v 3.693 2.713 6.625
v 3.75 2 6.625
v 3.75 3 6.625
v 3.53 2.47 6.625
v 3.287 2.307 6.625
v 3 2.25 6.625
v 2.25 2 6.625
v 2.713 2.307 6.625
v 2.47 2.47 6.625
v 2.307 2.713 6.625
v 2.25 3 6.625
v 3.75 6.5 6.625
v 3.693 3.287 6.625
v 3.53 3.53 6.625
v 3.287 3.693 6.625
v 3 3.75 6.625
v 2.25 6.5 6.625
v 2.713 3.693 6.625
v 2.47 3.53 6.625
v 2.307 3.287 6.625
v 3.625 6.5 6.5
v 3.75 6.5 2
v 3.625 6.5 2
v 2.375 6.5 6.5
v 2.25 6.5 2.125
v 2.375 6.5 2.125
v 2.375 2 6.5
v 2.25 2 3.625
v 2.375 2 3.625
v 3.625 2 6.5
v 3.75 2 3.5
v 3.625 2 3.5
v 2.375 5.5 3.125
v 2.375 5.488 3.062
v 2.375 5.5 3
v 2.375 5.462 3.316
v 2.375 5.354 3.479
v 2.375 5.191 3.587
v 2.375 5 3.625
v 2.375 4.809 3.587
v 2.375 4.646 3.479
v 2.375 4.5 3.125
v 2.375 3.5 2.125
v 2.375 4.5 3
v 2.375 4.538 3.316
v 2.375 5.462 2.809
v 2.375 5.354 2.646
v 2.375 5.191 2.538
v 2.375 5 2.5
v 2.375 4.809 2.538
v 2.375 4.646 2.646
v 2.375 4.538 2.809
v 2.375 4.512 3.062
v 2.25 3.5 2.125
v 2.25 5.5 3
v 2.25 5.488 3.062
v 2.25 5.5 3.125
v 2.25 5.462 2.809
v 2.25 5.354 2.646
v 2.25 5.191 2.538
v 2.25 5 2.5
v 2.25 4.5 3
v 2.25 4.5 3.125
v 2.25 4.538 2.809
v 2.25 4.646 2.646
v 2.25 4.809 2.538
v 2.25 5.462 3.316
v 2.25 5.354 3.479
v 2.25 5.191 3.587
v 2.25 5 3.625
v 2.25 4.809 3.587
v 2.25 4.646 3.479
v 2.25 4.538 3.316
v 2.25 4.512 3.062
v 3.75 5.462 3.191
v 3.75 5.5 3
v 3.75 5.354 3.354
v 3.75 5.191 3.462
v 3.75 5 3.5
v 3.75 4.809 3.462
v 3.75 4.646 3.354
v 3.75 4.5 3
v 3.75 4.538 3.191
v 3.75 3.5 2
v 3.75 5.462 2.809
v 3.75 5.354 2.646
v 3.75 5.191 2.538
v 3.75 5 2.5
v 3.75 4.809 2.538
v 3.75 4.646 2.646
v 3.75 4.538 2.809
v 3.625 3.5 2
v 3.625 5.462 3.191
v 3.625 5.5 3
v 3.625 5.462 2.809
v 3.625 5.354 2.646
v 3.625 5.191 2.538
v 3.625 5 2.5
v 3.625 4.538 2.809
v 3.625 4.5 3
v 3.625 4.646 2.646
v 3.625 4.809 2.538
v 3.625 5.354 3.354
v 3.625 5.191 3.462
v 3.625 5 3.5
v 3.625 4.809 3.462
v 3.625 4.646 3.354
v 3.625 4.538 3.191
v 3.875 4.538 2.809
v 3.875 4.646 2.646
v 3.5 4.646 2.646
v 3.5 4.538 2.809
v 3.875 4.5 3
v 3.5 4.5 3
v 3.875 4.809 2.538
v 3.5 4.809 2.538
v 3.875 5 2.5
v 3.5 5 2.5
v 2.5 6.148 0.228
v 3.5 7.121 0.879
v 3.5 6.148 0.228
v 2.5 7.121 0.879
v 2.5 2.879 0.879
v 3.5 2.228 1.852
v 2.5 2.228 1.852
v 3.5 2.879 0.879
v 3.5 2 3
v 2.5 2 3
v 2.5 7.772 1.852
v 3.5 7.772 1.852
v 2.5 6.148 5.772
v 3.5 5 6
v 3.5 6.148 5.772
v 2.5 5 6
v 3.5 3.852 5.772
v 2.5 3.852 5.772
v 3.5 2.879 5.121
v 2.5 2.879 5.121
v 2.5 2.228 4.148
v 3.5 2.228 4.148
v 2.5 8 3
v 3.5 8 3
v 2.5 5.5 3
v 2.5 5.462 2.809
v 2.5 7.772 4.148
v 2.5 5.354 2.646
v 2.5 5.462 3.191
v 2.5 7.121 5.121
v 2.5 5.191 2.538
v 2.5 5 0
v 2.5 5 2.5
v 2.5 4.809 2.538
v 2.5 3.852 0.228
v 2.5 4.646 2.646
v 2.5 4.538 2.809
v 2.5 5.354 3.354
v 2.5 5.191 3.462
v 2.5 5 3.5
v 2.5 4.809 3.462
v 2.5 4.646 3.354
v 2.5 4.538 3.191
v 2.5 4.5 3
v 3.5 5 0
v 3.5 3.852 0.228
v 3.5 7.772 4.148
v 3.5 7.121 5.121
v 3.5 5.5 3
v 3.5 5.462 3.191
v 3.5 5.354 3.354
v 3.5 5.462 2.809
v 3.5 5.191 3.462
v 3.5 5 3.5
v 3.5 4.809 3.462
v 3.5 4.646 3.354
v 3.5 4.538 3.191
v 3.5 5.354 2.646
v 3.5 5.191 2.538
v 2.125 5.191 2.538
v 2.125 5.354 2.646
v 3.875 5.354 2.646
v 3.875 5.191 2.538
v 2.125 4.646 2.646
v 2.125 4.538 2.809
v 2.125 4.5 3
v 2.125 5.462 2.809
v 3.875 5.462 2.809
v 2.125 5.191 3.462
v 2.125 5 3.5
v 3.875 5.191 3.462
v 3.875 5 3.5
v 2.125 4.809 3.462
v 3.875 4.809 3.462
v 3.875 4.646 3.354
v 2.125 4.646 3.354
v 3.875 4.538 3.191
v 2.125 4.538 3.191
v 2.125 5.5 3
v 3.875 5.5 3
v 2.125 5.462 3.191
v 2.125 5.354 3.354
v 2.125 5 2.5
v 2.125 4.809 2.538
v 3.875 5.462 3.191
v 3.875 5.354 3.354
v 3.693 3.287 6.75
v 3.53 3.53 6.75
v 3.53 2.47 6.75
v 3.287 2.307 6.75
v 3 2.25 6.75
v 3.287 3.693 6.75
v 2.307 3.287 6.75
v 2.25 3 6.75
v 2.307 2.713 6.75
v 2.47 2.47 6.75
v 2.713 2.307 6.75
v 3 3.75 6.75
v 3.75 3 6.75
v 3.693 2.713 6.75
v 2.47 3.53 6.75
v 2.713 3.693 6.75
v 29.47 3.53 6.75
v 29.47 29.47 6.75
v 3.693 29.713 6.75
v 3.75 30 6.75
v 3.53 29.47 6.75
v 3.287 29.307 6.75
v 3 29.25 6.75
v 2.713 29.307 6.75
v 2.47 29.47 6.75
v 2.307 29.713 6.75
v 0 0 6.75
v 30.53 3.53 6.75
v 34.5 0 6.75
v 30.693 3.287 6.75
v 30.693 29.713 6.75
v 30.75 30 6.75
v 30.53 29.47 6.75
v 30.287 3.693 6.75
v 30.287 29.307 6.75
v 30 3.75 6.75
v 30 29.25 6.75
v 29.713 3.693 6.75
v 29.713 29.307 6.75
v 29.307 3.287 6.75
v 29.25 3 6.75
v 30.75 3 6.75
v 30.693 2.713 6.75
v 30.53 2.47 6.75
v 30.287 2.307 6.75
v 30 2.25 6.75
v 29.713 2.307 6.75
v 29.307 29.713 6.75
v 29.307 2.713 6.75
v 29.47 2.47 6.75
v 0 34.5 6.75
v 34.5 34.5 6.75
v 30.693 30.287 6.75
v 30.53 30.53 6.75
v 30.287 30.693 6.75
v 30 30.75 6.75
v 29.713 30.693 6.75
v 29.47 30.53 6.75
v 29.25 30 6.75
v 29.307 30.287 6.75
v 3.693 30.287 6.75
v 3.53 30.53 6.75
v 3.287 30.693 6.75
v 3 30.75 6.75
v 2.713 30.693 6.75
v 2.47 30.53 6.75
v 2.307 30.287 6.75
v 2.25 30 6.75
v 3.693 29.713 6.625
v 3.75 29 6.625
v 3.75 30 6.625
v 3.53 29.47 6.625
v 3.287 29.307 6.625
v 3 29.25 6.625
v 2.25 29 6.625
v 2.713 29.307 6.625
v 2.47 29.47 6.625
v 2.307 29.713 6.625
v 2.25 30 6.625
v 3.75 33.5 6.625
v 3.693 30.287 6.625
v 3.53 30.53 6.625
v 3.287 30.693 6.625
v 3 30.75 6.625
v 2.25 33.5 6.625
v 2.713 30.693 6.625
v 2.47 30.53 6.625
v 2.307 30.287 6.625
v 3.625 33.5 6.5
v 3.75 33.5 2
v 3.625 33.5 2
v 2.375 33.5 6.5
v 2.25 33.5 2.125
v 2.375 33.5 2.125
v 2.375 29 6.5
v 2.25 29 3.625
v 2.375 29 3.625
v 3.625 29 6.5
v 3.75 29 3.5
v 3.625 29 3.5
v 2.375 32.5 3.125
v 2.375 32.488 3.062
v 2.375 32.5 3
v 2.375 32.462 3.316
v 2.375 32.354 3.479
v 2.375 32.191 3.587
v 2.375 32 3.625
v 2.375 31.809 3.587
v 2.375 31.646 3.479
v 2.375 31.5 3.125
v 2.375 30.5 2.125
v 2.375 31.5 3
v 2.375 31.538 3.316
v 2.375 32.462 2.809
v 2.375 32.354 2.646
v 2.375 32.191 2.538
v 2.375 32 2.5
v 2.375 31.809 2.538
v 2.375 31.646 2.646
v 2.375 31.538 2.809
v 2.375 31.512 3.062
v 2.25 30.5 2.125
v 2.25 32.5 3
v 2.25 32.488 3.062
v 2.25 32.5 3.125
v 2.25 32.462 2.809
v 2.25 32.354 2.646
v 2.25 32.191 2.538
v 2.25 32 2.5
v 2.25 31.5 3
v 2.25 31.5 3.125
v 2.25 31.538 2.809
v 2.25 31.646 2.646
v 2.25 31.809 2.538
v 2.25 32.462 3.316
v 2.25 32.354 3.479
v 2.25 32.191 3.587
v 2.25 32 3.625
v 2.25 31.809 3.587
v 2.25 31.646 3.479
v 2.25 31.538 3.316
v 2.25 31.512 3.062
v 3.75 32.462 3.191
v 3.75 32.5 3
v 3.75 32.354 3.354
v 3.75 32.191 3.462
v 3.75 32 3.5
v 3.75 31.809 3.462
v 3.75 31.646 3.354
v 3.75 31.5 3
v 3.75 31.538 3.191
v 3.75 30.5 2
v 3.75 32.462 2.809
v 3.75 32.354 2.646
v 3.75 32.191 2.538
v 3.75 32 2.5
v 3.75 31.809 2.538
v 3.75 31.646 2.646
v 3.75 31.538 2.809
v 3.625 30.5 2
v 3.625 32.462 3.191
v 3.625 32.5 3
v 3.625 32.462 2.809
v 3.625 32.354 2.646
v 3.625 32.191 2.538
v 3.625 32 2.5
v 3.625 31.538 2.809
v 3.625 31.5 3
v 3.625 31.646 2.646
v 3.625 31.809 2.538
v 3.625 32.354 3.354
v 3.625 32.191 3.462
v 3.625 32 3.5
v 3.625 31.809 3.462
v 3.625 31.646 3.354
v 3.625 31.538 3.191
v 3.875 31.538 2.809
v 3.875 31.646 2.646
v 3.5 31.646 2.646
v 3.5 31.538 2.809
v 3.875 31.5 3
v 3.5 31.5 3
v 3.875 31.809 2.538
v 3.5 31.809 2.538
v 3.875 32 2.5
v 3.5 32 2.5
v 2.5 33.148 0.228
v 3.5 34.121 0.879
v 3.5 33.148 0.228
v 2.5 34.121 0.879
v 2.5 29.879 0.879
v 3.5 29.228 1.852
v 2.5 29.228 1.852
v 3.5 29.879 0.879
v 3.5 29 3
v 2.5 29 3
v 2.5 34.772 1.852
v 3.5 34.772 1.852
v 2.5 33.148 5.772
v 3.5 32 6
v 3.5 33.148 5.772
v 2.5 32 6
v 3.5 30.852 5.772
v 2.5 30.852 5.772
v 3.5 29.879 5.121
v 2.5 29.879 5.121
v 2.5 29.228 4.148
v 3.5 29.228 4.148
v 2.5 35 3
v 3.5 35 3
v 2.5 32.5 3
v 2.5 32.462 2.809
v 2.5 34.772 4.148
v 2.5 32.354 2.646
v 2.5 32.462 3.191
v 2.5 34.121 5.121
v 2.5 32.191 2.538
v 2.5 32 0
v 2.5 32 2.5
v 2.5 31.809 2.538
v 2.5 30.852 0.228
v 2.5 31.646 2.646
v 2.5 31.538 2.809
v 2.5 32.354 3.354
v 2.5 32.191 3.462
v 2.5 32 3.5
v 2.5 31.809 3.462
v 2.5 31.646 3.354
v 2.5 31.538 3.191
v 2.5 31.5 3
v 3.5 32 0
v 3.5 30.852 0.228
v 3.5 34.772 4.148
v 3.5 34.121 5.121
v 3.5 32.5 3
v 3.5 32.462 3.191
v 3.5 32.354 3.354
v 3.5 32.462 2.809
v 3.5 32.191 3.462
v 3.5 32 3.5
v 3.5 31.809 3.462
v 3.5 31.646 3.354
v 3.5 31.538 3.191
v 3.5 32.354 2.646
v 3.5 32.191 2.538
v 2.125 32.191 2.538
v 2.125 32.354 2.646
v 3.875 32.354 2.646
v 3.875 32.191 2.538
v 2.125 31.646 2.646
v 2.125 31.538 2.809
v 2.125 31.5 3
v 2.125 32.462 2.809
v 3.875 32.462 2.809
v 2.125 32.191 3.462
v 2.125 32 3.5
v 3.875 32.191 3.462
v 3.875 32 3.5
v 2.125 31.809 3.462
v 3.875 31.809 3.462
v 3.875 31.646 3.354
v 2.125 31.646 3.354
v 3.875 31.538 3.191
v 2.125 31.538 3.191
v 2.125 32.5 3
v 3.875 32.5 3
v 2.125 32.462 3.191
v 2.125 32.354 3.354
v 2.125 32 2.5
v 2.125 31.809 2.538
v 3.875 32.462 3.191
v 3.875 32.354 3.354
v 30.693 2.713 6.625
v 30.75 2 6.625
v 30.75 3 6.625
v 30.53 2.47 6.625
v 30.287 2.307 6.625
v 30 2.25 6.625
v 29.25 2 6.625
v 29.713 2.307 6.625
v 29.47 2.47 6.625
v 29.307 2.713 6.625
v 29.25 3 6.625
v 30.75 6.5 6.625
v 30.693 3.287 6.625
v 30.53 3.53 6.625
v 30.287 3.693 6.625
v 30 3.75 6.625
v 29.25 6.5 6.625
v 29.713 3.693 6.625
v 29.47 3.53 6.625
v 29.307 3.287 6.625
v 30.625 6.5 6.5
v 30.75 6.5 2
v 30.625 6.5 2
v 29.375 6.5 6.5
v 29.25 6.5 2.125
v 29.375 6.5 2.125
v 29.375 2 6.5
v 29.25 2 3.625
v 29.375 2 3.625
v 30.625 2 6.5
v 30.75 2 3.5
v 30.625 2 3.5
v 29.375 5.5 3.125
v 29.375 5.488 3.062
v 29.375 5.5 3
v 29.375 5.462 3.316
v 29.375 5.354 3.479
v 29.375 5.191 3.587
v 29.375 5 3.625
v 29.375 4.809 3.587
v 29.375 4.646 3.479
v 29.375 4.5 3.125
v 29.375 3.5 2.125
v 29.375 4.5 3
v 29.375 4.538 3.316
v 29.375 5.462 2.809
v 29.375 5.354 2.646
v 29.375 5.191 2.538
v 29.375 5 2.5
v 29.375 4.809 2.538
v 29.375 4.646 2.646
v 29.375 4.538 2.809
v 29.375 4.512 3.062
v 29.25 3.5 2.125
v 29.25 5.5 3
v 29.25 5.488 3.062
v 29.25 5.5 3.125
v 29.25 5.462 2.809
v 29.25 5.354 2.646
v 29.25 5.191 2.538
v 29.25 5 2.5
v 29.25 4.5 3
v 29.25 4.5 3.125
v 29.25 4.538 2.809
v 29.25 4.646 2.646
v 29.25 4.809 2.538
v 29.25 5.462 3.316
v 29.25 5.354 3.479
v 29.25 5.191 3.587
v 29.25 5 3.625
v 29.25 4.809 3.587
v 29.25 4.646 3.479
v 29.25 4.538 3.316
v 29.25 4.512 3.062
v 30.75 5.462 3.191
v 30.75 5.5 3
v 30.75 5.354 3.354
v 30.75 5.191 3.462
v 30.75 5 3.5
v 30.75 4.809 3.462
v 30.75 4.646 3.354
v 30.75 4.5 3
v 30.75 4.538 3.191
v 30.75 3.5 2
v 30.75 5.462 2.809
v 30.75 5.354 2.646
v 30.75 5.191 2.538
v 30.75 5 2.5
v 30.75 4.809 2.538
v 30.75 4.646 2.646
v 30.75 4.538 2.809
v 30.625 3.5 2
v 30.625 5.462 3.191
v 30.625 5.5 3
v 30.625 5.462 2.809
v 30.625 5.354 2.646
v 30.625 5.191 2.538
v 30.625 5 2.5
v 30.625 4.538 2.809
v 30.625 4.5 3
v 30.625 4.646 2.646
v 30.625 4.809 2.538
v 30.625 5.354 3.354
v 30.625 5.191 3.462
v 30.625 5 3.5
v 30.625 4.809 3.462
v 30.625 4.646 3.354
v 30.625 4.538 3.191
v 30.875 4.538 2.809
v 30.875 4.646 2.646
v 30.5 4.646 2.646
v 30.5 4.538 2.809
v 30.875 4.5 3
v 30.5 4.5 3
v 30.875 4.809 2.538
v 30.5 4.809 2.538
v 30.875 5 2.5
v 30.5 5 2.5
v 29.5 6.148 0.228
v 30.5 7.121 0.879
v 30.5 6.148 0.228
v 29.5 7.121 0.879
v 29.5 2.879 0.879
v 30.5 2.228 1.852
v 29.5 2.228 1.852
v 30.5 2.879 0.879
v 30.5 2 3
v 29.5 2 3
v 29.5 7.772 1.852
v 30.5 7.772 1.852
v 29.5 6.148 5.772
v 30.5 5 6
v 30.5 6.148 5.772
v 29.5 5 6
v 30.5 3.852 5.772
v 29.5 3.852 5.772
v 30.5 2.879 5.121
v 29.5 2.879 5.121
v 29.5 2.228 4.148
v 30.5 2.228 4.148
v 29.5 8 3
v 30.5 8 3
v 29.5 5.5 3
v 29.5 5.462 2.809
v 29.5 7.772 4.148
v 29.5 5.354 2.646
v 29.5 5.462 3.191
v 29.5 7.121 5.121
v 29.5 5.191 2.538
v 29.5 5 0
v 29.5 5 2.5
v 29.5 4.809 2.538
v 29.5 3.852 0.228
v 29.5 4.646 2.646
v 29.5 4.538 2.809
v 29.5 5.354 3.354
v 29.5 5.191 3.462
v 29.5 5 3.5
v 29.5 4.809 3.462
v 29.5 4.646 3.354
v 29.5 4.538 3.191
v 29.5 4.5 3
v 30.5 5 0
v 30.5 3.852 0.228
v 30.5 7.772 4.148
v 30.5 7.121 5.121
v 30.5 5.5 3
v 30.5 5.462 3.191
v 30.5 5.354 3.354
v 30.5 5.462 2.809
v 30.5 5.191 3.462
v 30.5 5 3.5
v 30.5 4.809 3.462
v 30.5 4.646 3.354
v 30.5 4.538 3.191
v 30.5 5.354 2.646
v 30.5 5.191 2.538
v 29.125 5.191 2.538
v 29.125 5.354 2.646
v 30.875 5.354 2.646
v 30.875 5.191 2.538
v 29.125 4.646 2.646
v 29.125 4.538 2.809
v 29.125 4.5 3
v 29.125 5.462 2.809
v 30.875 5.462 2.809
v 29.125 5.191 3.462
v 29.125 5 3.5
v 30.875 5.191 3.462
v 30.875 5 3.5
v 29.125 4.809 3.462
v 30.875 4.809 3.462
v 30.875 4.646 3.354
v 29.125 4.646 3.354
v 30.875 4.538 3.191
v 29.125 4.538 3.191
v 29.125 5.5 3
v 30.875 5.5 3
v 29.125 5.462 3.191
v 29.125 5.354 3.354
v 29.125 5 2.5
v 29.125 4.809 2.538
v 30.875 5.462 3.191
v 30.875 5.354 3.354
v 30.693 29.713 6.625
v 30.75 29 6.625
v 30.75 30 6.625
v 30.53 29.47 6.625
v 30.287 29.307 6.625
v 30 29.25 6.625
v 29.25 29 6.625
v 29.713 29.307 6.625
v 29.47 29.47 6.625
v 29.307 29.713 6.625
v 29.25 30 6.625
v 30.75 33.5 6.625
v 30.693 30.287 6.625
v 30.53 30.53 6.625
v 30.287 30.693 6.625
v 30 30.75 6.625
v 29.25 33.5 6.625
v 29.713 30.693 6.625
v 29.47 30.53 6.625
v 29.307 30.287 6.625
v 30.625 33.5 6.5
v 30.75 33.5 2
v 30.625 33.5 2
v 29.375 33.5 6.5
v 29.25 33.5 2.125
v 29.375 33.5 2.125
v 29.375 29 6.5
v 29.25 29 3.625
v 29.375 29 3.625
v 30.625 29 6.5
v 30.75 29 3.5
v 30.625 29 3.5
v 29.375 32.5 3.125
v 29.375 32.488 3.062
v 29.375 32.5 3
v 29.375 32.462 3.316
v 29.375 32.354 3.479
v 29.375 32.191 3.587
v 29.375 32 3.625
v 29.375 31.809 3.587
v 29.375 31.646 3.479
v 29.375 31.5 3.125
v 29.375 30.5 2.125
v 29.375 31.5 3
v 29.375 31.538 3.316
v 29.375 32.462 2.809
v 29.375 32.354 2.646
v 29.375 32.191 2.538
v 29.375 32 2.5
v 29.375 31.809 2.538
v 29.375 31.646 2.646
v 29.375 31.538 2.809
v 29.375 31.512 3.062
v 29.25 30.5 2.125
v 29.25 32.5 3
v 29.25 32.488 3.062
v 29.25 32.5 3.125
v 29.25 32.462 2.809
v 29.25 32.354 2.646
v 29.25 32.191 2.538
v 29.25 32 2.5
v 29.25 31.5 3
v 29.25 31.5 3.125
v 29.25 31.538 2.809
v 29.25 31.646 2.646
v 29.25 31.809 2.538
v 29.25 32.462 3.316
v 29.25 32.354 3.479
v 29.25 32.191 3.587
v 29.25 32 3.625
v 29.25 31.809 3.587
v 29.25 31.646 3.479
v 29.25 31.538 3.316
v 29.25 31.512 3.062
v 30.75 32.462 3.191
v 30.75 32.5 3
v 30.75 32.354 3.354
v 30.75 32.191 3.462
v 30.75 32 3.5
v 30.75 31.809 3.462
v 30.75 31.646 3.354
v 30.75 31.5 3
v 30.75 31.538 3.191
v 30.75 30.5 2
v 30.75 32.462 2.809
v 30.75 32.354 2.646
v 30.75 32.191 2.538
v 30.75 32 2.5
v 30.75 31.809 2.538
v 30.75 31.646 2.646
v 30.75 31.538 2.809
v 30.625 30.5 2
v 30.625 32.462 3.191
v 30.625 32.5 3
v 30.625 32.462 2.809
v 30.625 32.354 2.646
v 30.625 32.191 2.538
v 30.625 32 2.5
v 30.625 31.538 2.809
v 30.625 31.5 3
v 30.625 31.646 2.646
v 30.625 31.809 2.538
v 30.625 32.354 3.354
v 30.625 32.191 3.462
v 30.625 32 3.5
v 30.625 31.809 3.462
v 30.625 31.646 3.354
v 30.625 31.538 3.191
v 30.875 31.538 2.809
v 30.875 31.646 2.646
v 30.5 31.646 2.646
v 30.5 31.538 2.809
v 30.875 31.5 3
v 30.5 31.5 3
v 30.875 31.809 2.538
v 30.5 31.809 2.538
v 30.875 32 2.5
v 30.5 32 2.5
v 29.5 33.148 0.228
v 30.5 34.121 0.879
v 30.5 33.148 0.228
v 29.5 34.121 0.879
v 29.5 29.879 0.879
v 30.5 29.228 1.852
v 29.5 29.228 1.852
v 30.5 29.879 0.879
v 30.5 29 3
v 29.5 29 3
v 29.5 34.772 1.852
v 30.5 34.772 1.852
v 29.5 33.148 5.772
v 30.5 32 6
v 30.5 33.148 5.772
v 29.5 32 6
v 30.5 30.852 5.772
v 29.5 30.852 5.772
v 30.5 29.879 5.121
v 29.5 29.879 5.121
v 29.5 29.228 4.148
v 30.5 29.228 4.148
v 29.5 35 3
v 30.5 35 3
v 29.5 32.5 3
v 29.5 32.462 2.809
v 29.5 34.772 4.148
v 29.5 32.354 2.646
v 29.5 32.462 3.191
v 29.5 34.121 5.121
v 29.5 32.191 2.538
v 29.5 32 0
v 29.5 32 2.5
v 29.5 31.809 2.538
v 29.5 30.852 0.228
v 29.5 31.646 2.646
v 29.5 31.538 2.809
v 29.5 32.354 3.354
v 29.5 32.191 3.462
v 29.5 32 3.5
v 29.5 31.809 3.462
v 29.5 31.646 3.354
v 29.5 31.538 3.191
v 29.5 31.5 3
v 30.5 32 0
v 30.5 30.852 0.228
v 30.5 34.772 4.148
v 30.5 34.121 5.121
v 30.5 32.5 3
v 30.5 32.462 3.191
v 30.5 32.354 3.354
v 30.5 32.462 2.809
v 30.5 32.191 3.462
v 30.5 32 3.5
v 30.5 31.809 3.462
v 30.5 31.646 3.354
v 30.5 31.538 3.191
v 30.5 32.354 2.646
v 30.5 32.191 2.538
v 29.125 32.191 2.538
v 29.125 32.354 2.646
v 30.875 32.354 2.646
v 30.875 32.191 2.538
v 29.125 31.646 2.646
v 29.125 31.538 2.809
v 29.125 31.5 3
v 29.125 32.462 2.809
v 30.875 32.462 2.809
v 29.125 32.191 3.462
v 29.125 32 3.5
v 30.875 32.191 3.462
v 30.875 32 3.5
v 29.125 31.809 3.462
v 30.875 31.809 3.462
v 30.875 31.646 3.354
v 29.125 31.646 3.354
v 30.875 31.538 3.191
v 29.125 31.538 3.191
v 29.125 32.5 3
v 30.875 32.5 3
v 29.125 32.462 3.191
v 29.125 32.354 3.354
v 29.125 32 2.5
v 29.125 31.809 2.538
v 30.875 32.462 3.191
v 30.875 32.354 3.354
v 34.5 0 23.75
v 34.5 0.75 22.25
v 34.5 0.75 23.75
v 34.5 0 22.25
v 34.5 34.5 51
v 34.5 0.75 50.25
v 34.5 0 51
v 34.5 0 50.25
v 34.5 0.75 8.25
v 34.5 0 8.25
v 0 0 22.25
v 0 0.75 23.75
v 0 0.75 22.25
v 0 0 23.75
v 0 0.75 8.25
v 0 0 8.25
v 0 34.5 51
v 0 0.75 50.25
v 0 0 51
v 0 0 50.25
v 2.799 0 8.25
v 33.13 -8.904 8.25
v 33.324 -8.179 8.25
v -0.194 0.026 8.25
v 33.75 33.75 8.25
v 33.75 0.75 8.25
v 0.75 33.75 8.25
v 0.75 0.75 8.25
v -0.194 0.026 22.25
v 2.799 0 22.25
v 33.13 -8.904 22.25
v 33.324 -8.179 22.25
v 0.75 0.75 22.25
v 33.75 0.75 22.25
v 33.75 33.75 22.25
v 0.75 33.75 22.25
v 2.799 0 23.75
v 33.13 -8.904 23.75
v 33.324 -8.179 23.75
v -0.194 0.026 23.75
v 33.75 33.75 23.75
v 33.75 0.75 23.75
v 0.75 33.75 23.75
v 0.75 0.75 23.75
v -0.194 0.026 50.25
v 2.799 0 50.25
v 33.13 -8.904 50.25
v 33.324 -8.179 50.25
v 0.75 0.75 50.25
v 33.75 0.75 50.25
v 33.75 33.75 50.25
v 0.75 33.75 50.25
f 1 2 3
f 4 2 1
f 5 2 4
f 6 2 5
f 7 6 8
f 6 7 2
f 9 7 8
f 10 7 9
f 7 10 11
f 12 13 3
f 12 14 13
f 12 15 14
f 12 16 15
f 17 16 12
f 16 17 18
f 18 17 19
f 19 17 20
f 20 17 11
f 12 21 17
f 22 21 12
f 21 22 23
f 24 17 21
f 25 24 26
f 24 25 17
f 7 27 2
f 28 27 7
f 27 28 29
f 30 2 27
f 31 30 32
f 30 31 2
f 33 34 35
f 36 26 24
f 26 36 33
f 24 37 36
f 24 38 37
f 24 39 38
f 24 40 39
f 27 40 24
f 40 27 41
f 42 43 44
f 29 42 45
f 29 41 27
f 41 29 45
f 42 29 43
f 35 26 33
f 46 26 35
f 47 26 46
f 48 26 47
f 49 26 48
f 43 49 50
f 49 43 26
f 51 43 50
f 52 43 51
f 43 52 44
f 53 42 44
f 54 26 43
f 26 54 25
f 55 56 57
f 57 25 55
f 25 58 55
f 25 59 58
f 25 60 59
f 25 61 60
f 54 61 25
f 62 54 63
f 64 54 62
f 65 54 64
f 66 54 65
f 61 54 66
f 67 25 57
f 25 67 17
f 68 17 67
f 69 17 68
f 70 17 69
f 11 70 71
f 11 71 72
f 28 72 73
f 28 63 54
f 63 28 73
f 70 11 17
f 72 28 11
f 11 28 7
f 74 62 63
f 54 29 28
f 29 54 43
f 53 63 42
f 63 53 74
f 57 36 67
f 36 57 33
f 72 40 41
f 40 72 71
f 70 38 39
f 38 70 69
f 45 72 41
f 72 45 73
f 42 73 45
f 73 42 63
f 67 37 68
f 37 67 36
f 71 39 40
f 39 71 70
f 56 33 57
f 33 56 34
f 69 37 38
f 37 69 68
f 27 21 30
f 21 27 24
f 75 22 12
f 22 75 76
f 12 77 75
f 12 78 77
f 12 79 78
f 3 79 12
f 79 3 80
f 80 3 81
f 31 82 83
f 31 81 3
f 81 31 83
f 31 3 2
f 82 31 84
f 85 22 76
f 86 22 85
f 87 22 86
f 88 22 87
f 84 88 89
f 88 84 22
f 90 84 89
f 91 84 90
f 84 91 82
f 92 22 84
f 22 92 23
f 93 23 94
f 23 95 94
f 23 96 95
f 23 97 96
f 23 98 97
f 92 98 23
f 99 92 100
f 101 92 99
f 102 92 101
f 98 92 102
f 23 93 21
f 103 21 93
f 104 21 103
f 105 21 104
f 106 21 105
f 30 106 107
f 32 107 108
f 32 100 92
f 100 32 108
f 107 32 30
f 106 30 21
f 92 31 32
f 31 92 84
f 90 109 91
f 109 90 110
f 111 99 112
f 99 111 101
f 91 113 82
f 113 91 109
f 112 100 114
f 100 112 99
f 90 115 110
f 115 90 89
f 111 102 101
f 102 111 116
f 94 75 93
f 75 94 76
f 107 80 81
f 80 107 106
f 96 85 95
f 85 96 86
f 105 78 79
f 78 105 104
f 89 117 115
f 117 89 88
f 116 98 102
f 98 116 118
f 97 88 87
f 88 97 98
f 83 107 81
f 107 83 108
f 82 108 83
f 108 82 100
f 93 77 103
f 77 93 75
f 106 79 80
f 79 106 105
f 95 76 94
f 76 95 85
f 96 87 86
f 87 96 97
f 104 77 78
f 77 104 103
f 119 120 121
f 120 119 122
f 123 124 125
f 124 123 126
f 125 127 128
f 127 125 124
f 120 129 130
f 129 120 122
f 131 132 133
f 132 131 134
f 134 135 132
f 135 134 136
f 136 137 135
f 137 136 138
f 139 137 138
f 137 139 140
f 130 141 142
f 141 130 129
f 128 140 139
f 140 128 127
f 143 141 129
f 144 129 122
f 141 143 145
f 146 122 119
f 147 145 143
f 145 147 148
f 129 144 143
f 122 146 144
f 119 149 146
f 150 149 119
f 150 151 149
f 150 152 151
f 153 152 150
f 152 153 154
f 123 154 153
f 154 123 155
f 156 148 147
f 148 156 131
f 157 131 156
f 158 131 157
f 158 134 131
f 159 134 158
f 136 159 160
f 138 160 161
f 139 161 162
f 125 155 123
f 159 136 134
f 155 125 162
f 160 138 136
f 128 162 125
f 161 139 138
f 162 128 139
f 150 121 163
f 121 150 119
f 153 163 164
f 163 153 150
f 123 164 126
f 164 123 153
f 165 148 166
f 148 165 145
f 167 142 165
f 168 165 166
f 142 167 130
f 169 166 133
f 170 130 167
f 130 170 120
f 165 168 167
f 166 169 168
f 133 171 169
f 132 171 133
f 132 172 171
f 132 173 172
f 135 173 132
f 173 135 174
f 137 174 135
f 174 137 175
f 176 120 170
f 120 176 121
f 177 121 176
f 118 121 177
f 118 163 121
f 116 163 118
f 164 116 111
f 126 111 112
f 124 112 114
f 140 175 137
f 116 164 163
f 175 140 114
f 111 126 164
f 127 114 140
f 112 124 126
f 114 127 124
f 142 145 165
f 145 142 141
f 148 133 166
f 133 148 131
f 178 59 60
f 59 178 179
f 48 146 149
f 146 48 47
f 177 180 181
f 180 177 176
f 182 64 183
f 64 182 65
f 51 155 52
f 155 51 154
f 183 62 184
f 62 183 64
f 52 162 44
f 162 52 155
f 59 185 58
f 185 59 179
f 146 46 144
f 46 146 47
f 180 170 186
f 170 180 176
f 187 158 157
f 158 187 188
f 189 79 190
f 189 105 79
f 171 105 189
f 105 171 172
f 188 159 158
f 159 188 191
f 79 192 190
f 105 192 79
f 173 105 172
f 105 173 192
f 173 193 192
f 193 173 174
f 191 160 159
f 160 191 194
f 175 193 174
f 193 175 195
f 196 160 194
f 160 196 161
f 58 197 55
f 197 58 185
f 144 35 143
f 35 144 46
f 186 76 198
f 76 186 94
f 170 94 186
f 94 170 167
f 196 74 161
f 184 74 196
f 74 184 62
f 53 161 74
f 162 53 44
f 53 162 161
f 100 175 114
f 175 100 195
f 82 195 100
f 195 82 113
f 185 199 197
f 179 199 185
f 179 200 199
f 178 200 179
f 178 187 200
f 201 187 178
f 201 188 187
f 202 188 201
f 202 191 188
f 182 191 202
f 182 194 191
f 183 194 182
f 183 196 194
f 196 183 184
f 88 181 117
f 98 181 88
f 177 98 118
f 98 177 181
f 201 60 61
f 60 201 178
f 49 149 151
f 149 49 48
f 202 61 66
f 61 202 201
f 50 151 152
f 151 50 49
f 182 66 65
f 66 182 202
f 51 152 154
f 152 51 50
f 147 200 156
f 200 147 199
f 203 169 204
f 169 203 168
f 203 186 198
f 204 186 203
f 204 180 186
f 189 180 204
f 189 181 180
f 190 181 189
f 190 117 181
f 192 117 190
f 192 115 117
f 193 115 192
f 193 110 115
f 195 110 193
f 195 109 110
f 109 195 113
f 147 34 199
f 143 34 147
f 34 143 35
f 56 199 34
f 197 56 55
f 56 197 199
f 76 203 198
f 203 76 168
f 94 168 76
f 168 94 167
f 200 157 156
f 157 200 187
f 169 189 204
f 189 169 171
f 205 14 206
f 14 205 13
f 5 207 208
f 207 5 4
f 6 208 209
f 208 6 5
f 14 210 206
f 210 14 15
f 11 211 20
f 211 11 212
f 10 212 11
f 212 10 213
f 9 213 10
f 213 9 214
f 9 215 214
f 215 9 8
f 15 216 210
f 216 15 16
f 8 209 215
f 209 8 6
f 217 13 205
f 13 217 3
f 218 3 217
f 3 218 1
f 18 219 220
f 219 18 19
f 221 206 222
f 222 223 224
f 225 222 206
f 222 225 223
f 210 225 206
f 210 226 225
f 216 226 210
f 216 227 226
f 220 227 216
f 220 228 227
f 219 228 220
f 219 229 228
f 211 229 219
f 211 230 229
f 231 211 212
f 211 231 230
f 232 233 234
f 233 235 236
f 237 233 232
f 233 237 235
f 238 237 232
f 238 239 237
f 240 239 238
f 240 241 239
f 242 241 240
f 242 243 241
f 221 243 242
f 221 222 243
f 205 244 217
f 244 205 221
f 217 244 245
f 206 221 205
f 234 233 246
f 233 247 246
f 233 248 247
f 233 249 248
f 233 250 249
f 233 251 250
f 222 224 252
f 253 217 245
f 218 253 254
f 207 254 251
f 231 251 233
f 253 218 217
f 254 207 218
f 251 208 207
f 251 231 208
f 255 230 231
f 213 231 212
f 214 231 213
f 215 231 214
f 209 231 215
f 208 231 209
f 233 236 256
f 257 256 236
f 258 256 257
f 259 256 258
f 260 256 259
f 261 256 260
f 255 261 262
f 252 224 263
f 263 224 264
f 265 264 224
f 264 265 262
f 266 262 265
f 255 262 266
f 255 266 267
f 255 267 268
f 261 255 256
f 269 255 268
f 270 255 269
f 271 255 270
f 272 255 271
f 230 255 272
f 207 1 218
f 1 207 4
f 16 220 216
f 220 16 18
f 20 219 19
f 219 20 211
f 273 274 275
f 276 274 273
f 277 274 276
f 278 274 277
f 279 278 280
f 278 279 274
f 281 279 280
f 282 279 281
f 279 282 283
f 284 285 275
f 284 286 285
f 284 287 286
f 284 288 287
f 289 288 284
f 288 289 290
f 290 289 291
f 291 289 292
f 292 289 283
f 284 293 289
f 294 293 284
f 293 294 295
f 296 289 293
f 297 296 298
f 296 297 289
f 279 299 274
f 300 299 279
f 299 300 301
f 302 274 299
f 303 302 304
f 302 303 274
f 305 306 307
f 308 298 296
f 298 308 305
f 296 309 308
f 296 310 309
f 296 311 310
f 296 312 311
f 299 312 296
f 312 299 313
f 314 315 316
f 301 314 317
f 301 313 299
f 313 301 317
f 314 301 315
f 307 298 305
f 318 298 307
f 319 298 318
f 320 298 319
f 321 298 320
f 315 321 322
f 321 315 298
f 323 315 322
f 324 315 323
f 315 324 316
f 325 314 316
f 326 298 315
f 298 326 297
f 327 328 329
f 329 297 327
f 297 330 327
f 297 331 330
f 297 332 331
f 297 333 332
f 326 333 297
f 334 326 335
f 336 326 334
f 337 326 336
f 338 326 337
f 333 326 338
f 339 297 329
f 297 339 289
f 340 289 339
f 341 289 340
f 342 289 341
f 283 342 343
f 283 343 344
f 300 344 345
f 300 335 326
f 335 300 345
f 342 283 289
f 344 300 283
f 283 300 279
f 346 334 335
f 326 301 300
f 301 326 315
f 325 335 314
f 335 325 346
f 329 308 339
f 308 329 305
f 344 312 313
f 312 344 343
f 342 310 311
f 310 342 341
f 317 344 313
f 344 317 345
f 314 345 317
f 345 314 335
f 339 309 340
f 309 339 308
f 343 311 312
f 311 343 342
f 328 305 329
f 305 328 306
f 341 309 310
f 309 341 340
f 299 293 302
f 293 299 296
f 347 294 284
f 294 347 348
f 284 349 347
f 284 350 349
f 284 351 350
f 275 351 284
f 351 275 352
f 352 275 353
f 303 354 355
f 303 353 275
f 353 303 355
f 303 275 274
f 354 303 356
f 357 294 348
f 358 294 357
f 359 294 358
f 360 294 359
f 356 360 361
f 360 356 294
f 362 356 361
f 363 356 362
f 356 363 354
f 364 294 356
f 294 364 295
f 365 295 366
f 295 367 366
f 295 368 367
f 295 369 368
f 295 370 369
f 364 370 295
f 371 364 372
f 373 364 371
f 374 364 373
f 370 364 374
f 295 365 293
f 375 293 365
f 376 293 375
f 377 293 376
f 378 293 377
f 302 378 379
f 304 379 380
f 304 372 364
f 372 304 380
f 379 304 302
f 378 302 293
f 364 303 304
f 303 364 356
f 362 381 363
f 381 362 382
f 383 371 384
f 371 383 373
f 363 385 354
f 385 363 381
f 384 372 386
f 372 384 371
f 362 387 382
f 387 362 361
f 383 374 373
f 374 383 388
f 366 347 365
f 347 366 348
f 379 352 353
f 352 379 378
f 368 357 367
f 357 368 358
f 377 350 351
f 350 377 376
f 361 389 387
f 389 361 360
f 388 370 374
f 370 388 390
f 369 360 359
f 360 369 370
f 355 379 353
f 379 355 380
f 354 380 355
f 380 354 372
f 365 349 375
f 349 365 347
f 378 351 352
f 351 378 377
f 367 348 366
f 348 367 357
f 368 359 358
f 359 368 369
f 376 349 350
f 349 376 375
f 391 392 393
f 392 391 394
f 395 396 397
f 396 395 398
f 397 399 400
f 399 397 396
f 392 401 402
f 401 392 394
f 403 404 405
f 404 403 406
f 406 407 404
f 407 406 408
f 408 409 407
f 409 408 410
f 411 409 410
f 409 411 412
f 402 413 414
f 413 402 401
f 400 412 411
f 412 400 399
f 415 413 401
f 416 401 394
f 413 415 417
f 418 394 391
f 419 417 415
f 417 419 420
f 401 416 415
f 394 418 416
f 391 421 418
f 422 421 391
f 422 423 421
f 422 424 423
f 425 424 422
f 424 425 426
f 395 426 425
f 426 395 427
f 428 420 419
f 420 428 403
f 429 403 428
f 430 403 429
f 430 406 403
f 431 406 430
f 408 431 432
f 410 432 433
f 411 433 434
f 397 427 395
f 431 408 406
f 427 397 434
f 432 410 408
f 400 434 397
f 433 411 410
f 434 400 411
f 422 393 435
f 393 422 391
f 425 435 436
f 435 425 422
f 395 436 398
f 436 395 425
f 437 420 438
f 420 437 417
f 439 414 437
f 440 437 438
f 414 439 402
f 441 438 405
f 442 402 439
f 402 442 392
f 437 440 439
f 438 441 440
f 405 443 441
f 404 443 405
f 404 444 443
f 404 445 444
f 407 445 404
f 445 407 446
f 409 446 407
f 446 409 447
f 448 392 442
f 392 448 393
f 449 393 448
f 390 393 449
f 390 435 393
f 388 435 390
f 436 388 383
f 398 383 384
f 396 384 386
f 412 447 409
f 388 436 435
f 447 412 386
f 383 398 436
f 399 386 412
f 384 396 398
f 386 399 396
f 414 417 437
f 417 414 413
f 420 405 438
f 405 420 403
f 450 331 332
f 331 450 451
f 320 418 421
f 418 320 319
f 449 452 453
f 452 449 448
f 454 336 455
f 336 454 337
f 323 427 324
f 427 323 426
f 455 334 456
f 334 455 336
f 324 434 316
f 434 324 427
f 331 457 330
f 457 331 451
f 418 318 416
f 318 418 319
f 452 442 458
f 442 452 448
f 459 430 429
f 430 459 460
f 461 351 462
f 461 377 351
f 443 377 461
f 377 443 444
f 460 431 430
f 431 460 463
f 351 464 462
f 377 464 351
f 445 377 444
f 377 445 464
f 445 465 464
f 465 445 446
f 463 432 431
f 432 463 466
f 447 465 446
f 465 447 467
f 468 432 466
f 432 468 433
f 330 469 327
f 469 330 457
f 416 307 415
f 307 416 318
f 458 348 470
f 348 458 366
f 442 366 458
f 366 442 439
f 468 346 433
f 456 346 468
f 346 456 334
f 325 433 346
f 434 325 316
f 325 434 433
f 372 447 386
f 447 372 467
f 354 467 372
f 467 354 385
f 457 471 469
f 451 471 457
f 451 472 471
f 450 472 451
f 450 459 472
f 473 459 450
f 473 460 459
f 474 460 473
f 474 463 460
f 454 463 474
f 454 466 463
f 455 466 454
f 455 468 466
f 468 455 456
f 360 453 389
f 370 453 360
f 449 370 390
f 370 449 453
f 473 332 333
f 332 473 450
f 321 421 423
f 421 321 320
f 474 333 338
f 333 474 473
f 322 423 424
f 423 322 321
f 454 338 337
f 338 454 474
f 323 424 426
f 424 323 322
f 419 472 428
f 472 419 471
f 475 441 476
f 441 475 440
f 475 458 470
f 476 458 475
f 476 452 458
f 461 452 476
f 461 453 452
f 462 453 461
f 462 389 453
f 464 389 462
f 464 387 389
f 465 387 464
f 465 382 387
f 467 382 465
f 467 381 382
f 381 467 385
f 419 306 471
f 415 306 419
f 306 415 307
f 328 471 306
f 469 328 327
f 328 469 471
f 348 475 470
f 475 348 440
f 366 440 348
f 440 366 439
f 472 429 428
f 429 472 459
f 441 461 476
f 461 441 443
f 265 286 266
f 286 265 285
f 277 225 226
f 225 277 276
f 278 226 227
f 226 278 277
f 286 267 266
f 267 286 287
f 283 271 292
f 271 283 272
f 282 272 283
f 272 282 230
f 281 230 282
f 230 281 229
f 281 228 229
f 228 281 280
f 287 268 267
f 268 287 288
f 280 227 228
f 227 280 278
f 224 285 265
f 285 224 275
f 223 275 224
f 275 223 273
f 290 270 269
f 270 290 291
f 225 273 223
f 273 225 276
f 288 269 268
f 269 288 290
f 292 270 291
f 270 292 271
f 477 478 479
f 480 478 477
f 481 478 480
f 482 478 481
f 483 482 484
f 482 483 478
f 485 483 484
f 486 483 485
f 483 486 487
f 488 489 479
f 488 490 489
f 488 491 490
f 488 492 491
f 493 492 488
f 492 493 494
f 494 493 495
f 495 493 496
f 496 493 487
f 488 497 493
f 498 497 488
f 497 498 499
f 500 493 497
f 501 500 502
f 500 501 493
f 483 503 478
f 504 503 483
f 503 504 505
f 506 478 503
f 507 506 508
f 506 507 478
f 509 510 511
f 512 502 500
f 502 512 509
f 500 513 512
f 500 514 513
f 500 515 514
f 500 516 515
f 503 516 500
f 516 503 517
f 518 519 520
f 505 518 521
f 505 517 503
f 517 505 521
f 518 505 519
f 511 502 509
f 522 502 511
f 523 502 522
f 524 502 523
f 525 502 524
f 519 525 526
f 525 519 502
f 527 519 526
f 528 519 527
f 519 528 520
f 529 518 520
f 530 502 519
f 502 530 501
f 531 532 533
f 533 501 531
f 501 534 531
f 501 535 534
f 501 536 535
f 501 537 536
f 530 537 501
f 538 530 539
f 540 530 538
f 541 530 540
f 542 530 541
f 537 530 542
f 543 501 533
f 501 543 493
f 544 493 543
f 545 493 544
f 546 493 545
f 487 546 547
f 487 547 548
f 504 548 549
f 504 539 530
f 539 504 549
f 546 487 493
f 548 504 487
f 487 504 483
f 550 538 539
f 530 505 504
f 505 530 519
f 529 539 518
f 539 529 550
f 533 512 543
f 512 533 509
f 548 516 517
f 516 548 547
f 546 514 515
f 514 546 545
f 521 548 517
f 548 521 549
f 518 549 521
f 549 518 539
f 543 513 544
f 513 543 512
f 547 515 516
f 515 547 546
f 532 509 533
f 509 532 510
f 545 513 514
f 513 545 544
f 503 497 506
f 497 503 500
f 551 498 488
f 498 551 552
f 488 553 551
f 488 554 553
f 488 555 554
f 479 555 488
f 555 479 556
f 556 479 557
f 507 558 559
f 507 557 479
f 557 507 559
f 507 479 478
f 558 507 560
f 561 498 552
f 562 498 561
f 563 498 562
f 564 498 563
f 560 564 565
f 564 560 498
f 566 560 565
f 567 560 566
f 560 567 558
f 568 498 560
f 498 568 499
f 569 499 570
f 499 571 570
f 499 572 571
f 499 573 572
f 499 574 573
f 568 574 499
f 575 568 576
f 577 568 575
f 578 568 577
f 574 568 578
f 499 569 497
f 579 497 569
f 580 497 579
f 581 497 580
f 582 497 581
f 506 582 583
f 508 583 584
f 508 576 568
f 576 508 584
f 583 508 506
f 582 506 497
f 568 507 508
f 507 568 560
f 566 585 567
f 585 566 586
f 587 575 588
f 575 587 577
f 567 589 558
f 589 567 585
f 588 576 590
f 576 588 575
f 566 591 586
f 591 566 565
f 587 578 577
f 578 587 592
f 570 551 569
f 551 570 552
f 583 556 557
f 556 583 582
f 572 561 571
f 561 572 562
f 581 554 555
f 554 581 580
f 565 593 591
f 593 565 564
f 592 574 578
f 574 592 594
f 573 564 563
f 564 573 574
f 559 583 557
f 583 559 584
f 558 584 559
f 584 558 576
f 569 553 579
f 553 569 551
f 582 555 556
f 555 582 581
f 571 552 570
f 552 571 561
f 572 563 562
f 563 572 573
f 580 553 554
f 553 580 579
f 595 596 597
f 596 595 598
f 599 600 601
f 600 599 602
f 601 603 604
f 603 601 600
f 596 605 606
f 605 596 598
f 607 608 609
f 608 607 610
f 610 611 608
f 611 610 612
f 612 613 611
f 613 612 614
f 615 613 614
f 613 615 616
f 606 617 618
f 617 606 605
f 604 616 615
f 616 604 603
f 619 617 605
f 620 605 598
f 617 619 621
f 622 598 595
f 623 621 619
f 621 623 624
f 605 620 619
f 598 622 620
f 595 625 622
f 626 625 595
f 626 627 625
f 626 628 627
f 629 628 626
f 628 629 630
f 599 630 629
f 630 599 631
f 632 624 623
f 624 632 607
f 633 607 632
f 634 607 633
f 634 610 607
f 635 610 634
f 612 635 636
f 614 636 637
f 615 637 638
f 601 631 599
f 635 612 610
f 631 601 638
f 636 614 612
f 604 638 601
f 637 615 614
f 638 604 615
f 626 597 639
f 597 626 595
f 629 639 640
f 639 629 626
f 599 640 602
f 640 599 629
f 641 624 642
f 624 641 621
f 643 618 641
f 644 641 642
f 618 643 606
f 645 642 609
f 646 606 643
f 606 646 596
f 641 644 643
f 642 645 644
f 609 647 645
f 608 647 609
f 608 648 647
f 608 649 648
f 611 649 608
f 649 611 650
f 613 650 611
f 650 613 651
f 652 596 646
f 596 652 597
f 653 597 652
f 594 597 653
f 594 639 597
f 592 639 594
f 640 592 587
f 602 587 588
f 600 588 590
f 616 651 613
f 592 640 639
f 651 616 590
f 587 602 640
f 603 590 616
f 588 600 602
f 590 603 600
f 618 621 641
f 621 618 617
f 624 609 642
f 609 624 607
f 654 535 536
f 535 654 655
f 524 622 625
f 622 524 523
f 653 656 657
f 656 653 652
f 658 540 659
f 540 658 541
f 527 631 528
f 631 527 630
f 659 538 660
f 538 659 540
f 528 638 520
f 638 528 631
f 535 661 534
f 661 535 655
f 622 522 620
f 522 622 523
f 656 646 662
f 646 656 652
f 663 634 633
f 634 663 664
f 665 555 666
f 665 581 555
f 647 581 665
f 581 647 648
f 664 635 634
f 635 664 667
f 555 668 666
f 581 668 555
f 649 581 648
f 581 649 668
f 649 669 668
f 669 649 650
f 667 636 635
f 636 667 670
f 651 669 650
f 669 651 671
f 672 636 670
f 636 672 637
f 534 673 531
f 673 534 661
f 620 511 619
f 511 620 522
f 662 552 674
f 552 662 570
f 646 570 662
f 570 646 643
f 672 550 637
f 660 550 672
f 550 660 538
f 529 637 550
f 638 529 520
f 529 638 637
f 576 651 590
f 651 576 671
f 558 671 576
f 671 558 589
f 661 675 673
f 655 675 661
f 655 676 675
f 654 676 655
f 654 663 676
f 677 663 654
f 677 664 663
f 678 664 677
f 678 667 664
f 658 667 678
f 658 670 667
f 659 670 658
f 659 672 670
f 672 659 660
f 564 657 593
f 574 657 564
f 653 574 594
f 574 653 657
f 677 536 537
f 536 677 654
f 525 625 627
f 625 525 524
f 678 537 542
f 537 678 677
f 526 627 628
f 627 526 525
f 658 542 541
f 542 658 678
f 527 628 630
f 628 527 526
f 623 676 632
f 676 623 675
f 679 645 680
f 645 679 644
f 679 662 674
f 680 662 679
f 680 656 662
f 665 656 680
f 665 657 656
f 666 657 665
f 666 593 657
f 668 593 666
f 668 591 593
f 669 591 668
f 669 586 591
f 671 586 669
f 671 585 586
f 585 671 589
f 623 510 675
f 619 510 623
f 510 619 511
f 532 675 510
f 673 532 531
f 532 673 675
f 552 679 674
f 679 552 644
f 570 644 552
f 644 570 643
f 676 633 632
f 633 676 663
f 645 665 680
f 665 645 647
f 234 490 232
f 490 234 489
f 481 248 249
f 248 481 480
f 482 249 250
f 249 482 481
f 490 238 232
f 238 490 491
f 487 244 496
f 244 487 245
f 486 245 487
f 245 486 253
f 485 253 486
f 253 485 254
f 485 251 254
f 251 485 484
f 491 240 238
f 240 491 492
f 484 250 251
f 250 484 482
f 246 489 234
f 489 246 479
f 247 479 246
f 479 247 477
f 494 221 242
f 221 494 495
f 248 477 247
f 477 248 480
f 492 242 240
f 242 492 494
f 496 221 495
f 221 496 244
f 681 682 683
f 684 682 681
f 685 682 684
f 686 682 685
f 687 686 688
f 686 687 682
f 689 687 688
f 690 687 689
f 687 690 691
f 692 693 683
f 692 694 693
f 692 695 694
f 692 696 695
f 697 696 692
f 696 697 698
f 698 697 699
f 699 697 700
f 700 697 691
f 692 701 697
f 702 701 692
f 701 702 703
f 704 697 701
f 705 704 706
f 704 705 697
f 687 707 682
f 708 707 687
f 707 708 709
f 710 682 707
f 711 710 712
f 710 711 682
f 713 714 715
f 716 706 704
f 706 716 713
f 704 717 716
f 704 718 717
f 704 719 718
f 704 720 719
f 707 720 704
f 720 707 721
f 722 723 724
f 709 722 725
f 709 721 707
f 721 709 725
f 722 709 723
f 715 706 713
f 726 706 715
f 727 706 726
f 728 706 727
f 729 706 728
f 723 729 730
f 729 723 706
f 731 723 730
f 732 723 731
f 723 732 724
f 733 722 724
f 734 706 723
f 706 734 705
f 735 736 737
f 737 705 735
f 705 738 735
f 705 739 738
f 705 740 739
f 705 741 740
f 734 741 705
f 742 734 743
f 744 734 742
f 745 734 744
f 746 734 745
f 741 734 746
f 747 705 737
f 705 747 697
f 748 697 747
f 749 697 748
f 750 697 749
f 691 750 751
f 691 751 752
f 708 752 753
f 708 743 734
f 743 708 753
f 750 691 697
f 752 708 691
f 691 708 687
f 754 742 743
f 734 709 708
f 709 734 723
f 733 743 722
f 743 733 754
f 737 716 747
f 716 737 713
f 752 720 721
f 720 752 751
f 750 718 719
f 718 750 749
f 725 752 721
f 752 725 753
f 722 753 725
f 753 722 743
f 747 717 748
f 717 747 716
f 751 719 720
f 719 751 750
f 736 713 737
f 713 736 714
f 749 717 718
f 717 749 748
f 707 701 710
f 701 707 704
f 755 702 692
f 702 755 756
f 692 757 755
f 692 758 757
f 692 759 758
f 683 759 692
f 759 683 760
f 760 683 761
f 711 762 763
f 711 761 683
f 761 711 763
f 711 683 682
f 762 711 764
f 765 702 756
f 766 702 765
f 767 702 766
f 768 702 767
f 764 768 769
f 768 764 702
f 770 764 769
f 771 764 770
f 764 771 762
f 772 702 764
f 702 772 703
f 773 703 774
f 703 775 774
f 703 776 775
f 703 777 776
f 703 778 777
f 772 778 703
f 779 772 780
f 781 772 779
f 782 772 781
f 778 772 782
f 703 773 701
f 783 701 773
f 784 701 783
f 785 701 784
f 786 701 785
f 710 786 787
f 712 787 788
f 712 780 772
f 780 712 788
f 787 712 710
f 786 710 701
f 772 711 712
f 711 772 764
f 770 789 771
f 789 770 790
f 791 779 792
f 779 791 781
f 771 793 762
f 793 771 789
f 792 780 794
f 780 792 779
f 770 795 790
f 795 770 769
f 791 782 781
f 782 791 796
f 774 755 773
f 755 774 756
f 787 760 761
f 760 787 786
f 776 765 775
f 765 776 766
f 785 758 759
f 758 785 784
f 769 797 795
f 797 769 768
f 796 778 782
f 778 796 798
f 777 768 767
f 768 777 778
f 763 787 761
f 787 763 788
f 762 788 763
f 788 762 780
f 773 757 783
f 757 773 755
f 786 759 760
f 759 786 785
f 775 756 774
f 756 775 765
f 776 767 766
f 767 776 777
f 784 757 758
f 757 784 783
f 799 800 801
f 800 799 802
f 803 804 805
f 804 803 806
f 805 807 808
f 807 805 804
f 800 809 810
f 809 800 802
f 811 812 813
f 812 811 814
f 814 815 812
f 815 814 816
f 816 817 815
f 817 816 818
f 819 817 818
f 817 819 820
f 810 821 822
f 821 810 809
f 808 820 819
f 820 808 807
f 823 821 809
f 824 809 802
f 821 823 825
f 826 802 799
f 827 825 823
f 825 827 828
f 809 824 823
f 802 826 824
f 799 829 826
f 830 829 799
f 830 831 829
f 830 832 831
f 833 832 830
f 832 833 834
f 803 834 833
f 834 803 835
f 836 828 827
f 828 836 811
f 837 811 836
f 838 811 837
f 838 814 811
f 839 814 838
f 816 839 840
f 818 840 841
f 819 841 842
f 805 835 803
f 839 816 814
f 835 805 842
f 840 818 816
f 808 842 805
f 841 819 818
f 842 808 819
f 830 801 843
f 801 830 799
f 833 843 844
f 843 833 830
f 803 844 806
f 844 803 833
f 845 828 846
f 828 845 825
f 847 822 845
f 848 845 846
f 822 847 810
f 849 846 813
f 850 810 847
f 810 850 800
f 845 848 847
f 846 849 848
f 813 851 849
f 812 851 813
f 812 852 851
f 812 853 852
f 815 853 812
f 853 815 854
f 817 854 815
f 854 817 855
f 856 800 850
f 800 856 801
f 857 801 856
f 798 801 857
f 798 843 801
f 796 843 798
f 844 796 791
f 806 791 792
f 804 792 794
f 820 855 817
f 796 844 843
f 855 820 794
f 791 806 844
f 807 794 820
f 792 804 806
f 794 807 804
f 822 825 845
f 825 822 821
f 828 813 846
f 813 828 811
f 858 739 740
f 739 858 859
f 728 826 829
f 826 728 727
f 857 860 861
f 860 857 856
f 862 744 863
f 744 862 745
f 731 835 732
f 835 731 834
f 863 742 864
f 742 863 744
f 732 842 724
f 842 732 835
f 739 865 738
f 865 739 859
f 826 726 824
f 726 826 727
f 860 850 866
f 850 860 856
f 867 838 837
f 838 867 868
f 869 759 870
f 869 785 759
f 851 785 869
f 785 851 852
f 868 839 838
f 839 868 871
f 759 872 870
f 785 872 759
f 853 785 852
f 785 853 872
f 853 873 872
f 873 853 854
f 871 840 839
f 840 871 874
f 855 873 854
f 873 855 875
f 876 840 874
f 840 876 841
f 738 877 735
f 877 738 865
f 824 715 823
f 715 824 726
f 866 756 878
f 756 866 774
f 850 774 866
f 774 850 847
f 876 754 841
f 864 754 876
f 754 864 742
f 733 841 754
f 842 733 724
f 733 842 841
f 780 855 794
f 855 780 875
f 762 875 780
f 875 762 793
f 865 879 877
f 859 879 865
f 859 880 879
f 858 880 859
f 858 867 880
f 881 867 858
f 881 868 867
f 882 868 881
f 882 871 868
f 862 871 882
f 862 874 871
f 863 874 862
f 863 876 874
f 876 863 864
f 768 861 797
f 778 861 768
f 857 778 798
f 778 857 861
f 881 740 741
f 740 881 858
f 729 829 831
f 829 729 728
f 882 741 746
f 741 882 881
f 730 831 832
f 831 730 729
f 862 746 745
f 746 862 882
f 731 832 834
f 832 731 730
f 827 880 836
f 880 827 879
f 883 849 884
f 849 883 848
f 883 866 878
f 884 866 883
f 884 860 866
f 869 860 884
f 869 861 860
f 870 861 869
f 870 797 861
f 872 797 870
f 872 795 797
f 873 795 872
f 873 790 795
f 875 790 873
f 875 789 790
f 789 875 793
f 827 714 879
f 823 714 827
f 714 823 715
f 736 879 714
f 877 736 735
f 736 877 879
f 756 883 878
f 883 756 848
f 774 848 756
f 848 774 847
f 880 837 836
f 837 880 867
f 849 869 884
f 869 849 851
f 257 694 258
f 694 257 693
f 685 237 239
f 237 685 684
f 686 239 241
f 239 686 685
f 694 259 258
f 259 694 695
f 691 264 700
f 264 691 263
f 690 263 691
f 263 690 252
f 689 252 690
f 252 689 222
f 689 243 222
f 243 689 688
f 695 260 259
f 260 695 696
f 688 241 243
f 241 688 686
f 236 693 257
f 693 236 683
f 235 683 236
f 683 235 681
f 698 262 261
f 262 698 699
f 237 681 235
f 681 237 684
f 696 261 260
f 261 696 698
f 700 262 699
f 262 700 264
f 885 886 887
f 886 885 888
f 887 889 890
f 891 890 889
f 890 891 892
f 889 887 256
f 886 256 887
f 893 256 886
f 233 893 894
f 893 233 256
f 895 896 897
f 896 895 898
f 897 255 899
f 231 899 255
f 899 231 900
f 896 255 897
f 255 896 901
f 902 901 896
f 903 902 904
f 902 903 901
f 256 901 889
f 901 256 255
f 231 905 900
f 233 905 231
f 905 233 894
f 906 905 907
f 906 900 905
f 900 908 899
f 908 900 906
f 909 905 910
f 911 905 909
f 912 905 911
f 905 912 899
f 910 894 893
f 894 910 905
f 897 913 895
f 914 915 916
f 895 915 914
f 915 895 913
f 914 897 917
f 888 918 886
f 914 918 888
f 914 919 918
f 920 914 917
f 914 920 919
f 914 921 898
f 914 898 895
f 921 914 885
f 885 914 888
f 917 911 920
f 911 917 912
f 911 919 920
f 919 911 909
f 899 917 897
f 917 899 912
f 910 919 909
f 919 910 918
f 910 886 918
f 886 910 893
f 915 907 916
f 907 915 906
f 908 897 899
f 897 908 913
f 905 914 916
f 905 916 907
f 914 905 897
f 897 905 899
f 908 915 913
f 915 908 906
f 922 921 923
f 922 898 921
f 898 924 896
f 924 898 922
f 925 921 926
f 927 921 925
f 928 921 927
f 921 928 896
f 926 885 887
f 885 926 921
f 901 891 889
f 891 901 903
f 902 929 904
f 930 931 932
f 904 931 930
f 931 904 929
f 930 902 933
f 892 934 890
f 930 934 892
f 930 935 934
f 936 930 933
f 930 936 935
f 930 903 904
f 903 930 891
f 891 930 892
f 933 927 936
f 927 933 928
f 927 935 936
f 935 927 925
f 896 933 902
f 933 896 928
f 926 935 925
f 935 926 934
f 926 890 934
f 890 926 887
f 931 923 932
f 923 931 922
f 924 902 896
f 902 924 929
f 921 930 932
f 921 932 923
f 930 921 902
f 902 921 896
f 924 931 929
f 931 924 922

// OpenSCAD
// file: casters.scad
function caster_axel(wheel_r, axel_r) = [1 + axel_r, wheel_r + axel_r, 0];

module caster_bracket(wheel_r, wheel_h, axel_r, plate_t, padding=0.125, $fn=$fn) {
    plate_side = wheel_r + axel_r + 1;
    
    module caster_plate(
        wheel_r,
        axel_r,
        plate_t,
    ) {
        difference() {
            linear_extrude(plate_t)
            polygon([
                [0, 0],
                [0, plate_side],
                [2 + axel_r * 2, plate_side],
                [plate_side, 2 + axel_r * 2],
                [plate_side, 0],
            ]);
            
            axel = caster_axel(wheel_r, axel_r);
            translate(axel)
            cylinder(r=axel_r, h=plate_t, $fn=$fn);
        }
    }

    translate([0, -plate_t, 0])
    union() {
        translate([0, plate_t, 0]);
        caster_plate(wheel_r, axel_r, plate_t);

        translate([0, plate_t, wheel_h + (plate_t + padding * 2)])
        caster_plate(wheel_r, axel_r, plate_t);
        
        cube([plate_side, plate_t, wheel_h + ((plate_t + padding) * 2)]);
    }
}

module caster(
    wheel_r,
    wheel_h,
    axel_r,
    axel_h,
    bearing_r=0,
    bearing_h=0,
    plate_t=0.125,
    padding=0.125,
    $fn=$fn,
) {
    rotate([-90, 0, -90])
    translate([-(caster_axel(wheel_r, axel_r).y), bearing_h - (wheel_r * 2) - 1 + plate_t + padding, -((wheel_h/2) + plate_t + padding)])
    union() {
        caster_bracket(wheel_r, wheel_h, axel_r, plate_t, padding, $fn=$fn);
        
        translate(caster_axel(wheel_r, axel_r)) {
            translate([0, 0, plate_t + padding])
            cylinder(r = wheel_r, h=wheel_h, $fn=$fn);
            
            translate([0, 0, -padding]) {
                cylinder(r = axel_r, h = (wheel_h + (2* plate_t) + (padding*4)), $fn=$fn);
            }
        }
        
        translate([caster_axel(wheel_r, axel_r).y, 0, (wheel_h/2) + plate_t + padding])
        rotate([90, 0, 0]) {
            cylinder(r = bearing_r, h=bearing_h);
            
            translate([0, 0, bearing_h])
            cylinder(r=axel_r, h=axel_h, $fn=$fn);
        }
    }
}

caster(
    // wheel (r, h)
    5, 1, 
    // axel (r, h)
    0.5, 1,
    // bearing (r, h)
    0.75, 0.25,
    $fn=16
);
// file: box.scad
function sorted(arr) = !(len(arr)>0) ? [] : let(
    pivot   = arr[floor(len(arr)/2)],
    lesser  = [ for (y = arr) if (y  < pivot) y ],
    equal   = [ for (y = arr) if (y == pivot) y ],
    greater = [ for (y = arr) if (y  > pivot) y ]
) concat(
    sorted(lesser), equal, sorted(greater)
);

module ccube(dimensions) {
    ds = sorted(dimensions);
    echo(ds.y, ds.z, 1, "// thickness", ds.x);
    cube(dimensions);
}

module topbottom(dimensions, thickness, back_inset) {
    ccube([dimensions.x + (thickness * 2), dimensions.y + (thickness * 2) + back_inset, thickness]);
}

module side(dimensions, thickness) {
    ccube([thickness, dimensions.y, dimensions.z]);
}

module frontback(dimensions, thickness) {
    ccube([dimensions.x + (thickness * 2), thickness, dimensions.z]);
}

module box(dimensions, thickness, back_inset=0) {    
    translate([0, 0, 0]);
    topbottom(dimensions, thickness, back_inset);
    
    translate([0, 0, dimensions.z + thickness])
    topbottom(dimensions, thickness, back_inset);
    
    translate([0, thickness, thickness])
    side(dimensions, thickness);

    translate([dimensions.x + thickness, thickness, thickness])
    side(dimensions, thickness);
    
    translate([0, dimensions.y + thickness, thickness])
    frontback(dimensions, thickness);
    
    translate([0, thickness, thickness])
    rotate([0, 0, -15])
    mirror([0, 1, 0])
    frontback(dimensions, thickness);
}

box([5, 5, 5], 0.5, 1);
// main file
use <box.scad>
use <casters.scad>

padding = 1.5;
mdf_thickness = 0.75;
pin_inset = 3;

function padded(dims, padding) = [for(e=dims) e+padding];

// dimensions for things
prusa = padded([31.5, 31.5, 35.5], padding);
cr10 = padded([19, 27, 25], padding);
repbox = padded([19, 12.5, 12.5], padding);
cart = [prusa.x, prusa.y, 6.75 + mdf_thickness];

module cart() {
    for(x=[pin_inset, cart.x - pin_inset])
    for(y=[pin_inset, cart.y - pin_inset])
    translate([x, y, 0])
    caster(
        // wheel (r, h)
        3, 1, 
        // axel (r, h)
        0.5, 1,
        // bearing (r, h)
        0.75, 0.25,
        $fn=16
    );
    
    translate([0, 0, cart.z - mdf_thickness])
    ccube([prusa.x + (mdf_thickness * 2), prusa.y + (mdf_thickness * 2), mdf_thickness]);
}

module printer_rack() {
    translate([0, 0, 0])
    cart();
       
    //translate([0, 0, cart.z])
    //box(prusa, mdf_thickness);

    translate([0, 0, cart.z])
    box([prusa.x, prusa.y, repbox.z], mdf_thickness);

    translate([0, 0, cart.z + repbox.z + mdf_thickness * 2])
    box([prusa.x, prusa.y, cr10.z], mdf_thickness);
}

printer_rack();
